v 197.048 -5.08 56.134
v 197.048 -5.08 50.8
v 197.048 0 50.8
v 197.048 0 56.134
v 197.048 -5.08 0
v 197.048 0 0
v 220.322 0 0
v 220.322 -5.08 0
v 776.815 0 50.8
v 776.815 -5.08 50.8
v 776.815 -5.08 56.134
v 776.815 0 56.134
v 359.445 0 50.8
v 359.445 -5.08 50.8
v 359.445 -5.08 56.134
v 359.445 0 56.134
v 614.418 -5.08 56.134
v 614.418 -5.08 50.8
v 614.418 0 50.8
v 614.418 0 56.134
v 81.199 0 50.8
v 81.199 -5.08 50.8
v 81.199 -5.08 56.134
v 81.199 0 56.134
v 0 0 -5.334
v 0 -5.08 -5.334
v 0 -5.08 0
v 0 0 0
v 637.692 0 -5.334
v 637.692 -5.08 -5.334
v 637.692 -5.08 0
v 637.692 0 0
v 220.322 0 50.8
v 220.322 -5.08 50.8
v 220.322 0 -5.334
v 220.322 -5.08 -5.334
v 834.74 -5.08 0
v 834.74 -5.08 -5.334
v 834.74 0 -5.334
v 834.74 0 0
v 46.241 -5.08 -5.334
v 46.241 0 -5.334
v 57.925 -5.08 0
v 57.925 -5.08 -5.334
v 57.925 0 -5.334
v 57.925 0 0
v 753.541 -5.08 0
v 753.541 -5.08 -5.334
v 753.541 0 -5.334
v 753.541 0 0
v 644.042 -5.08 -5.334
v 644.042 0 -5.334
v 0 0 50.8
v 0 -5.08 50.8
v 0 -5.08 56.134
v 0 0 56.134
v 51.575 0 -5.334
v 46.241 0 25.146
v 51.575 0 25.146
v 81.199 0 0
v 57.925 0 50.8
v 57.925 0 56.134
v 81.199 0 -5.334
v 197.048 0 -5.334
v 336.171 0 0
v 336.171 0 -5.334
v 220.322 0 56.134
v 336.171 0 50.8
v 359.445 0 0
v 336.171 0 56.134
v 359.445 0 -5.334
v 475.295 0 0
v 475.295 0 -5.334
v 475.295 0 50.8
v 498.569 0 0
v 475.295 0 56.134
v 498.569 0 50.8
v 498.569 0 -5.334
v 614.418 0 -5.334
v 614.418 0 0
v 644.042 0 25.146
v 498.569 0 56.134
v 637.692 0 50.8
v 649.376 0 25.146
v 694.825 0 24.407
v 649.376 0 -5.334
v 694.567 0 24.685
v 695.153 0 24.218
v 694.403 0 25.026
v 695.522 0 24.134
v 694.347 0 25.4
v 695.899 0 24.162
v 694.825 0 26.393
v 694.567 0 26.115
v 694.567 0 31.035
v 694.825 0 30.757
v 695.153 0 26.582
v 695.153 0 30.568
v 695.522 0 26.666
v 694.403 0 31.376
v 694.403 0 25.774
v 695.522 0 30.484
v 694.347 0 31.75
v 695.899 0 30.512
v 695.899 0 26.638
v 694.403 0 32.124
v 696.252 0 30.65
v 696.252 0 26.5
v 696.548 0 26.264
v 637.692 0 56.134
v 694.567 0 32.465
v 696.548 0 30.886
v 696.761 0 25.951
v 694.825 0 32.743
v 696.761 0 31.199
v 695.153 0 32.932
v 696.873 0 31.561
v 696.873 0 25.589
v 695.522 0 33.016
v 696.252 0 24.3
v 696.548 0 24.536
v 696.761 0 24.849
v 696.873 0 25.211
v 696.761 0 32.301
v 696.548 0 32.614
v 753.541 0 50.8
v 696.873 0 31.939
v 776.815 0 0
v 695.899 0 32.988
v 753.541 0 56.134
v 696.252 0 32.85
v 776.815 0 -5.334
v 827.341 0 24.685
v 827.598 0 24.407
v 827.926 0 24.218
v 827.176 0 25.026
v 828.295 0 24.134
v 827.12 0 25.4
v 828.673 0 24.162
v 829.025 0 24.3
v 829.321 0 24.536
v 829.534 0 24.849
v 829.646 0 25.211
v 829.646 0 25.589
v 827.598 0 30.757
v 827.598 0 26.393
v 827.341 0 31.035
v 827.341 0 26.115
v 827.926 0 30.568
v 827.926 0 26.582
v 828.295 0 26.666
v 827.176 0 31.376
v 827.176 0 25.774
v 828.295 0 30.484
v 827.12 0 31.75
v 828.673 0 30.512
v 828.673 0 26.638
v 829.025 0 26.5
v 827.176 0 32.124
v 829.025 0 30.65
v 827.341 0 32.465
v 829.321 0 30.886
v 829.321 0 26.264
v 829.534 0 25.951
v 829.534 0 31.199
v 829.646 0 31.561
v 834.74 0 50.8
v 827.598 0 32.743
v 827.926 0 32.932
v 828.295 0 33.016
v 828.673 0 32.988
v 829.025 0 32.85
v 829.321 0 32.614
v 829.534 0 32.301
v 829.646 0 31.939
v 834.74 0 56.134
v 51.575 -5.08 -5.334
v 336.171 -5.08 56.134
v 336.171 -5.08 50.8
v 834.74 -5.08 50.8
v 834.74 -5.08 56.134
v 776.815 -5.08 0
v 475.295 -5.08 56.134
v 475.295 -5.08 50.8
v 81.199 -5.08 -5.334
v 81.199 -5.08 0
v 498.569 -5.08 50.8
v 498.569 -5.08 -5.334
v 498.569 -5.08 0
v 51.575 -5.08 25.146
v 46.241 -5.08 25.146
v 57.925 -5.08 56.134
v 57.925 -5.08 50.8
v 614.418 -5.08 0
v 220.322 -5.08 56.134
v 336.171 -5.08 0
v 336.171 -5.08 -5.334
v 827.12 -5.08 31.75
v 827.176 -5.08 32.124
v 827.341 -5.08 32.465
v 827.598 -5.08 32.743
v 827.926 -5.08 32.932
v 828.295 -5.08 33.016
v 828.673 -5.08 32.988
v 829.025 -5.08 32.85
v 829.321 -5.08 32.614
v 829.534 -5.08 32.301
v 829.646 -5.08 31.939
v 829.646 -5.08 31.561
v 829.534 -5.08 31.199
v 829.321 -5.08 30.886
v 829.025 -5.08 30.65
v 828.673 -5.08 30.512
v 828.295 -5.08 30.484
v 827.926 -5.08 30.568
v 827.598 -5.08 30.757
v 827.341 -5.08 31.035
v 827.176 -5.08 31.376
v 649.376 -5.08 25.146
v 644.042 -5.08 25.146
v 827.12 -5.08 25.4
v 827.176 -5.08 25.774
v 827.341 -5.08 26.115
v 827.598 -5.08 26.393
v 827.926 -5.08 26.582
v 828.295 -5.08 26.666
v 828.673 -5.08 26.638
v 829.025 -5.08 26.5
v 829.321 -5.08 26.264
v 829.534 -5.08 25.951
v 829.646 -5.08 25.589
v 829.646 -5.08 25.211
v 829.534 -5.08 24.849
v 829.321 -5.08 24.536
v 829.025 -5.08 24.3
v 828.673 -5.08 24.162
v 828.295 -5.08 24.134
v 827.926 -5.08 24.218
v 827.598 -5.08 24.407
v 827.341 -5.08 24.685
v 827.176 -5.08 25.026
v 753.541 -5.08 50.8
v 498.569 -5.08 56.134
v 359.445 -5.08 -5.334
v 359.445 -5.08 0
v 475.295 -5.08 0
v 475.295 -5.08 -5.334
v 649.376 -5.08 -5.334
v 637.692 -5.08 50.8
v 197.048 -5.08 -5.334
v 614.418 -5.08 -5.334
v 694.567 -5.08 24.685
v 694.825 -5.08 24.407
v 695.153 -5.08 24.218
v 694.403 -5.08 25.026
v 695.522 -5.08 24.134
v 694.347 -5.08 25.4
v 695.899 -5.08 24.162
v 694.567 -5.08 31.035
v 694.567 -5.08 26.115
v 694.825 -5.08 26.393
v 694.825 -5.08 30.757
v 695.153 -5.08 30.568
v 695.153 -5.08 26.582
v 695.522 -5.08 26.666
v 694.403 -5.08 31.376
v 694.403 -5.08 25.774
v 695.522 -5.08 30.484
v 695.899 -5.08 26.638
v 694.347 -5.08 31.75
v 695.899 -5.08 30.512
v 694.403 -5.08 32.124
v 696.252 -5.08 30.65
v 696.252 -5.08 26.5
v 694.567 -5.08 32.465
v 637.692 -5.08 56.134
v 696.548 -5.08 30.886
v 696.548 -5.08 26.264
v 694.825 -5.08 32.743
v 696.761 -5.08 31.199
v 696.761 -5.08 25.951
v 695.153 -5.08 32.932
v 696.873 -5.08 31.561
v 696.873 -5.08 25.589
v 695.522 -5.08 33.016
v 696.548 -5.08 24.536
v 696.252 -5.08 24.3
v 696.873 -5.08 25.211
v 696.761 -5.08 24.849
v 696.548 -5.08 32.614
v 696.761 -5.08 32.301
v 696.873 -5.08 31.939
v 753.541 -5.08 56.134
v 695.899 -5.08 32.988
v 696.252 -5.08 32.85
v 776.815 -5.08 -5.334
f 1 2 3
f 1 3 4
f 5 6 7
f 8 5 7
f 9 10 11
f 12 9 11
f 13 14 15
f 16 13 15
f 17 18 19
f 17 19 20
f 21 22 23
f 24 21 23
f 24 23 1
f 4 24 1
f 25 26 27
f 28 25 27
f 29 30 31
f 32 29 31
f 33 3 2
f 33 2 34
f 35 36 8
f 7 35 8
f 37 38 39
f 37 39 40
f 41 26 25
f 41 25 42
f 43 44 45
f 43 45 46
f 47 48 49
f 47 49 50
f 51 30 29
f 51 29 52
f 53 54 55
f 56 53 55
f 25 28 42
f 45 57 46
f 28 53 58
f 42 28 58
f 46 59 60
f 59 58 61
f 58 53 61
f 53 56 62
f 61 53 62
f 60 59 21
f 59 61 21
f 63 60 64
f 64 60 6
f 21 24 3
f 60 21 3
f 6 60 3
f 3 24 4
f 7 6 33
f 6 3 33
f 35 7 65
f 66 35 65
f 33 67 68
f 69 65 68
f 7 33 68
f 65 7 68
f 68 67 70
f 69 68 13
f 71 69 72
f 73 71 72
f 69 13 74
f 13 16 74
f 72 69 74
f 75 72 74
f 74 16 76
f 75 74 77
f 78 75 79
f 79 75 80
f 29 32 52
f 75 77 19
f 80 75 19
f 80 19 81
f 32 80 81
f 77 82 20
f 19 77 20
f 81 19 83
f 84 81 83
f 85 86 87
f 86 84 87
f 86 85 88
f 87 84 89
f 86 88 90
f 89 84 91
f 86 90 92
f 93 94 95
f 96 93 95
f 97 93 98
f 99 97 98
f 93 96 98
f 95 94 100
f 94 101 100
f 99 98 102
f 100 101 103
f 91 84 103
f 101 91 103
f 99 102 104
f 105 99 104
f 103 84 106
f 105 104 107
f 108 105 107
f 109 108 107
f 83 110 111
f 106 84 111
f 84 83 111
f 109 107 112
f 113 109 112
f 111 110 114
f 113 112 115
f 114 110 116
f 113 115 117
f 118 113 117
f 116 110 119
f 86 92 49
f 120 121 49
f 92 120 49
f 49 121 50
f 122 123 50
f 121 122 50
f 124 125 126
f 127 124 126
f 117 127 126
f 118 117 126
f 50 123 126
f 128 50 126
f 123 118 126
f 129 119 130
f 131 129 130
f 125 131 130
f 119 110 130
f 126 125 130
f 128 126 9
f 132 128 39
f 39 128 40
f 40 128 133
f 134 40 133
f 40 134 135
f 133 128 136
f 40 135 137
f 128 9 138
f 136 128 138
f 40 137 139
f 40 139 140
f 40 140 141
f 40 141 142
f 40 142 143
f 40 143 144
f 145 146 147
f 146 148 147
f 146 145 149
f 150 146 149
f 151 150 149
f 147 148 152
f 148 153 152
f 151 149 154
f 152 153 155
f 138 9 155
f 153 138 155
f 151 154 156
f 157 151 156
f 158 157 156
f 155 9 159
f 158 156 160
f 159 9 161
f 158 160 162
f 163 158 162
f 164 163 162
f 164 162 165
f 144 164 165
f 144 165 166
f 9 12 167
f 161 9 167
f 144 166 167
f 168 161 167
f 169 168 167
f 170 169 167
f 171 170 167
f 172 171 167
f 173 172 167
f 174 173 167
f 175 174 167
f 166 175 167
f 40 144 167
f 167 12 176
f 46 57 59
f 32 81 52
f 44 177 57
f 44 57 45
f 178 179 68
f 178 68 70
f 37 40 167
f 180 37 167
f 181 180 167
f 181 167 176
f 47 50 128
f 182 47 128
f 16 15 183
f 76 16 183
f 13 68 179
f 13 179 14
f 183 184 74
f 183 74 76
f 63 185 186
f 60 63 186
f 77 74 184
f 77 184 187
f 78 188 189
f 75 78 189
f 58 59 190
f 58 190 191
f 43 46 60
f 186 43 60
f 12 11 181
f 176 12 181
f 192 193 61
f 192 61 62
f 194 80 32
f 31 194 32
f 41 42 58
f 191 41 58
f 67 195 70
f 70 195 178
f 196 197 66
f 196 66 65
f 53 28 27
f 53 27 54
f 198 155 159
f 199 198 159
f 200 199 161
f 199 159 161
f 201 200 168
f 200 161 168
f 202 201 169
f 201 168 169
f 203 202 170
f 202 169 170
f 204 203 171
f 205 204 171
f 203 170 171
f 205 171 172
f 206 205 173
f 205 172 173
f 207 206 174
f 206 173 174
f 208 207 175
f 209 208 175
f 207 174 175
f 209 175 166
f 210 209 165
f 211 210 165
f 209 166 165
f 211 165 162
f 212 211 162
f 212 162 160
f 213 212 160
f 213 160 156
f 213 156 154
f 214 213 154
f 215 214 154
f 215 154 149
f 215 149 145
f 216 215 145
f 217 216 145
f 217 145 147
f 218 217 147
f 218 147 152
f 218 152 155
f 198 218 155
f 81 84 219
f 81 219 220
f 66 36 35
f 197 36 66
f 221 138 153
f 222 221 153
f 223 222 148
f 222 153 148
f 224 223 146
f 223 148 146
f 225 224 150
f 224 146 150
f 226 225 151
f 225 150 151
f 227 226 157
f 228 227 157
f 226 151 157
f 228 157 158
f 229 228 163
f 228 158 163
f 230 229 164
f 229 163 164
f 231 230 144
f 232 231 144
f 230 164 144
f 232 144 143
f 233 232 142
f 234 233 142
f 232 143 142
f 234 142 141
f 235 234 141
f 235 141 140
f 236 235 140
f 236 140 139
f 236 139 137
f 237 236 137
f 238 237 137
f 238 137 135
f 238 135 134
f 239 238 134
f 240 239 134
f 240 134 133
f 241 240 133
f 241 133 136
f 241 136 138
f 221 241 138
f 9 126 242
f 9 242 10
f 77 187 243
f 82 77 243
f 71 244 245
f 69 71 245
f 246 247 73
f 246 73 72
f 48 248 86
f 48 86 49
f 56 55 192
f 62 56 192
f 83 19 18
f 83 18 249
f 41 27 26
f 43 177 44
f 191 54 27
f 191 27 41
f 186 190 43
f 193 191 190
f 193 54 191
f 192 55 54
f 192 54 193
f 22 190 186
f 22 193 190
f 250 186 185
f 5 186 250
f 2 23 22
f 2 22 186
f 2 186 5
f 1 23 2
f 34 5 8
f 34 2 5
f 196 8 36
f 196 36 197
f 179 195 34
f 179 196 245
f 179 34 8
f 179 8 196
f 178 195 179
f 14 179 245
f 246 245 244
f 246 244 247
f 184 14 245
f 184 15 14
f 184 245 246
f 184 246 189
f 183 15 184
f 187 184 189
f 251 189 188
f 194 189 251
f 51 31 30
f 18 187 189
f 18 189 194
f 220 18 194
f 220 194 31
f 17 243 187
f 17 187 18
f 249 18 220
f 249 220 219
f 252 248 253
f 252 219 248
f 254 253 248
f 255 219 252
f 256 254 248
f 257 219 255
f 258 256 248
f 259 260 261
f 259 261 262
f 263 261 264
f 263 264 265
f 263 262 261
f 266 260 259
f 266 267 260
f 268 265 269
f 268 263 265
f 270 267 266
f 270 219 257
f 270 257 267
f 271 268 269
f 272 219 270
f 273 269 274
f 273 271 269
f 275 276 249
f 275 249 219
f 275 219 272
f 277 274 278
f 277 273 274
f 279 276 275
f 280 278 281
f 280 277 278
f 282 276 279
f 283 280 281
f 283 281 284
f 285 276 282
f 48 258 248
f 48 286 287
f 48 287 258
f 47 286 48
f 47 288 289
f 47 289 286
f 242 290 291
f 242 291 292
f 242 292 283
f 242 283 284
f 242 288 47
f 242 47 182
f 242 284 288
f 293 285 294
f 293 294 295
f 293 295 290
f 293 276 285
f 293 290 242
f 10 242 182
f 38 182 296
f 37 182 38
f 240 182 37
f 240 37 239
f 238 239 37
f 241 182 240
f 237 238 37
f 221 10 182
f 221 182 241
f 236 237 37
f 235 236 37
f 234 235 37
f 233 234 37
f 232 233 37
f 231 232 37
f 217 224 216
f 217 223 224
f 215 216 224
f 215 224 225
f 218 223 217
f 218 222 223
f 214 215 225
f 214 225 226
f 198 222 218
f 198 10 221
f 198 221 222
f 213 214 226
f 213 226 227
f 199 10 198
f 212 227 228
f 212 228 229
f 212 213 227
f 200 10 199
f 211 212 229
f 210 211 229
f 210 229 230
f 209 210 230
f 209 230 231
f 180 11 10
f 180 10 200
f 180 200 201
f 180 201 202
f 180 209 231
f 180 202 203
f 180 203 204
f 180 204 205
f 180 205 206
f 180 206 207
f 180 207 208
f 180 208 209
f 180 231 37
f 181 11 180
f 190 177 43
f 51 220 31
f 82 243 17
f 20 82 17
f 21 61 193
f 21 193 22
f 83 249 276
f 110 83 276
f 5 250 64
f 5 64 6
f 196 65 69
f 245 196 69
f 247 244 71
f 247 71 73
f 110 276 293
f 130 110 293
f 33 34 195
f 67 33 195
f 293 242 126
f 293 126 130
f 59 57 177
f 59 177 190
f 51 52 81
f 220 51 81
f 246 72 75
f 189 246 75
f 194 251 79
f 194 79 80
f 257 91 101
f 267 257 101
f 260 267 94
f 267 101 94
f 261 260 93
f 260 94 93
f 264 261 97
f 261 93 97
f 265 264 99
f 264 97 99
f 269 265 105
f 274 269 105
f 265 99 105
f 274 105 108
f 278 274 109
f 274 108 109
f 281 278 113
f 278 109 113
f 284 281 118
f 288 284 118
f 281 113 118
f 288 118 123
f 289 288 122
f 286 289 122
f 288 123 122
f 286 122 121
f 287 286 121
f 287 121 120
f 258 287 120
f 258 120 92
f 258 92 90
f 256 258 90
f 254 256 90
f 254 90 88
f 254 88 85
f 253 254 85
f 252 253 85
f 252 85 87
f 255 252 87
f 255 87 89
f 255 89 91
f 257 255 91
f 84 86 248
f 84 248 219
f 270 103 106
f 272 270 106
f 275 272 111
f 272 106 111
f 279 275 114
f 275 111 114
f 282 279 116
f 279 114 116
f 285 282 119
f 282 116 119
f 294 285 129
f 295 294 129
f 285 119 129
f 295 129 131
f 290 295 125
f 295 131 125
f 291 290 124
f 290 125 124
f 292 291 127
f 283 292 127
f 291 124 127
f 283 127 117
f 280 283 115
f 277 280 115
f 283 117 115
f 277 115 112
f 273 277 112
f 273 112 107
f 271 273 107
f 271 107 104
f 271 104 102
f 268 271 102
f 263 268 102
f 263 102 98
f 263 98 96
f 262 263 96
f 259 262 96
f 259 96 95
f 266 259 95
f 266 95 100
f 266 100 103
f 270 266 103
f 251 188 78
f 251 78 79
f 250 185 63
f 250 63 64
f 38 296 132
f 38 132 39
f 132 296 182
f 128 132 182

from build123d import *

# Parameters (mm, degrees)
F0_W     = 834.740075
F0_H     = 50.8
F1_DEPTH = 5.08
F3_W     = 57.9247
F3_H     = 5.334
F3_W_2   = 115.8494
F4_DEPTH = 5.08
F5_W     = 5.334
F5_H     = 30.48
F6_DEPTH = 25.4
F7_R     = 1.27
F8_DEPTH = 5.081


with BuildPart() as f1:
    # F0 (on Front) → F1 (new body)
    with BuildSketch(Plane.XZ):
        with Locations((417.370037, 25.4)):
            Rectangle(F0_W, F0_H)
    extrude(amount=F1_DEPTH)

    # F3 (on face) → F4 (join)
    with BuildSketch(Plane.XZ.offset(5.08)):
        with Locations((28.96235, 53.467)):
            Rectangle(F3_W, F3_H)
        with Locations((139.123346, 53.467)):
            Rectangle(F3_W_2, F3_H)
        with Locations((28.96235, -2.667)):
            Rectangle(F3_W, F3_H)
        with Locations((139.123346, -2.667)):
            Rectangle(F3_W_2, F3_H)
        with Locations((278.246692, 53.467)):
            Rectangle(F3_W_2, F3_H)
        with Locations((278.246692, -2.667)):
            Rectangle(F3_W_2, F3_H)
        with Locations((417.370038, 53.467)):
            Rectangle(F3_W_2, F3_H)
        with Locations((417.370038, -2.667)):
            Rectangle(F3_W_2, F3_H)
        with Locations((556.493384, 53.467)):
            Rectangle(F3_W_2, F3_H)
        with Locations((556.493384, -2.667)):
            Rectangle(F3_W_2, F3_H)
        with Locations((695.61673, 53.467)):
            Rectangle(F3_W_2, F3_H)
        with Locations((695.61673, -2.667)):
            Rectangle(F3_W_2, F3_H)
        with Locations((805.777725, 53.467)):
            Rectangle(F3_W, F3_H)
        with Locations((805.777725, -2.667)):
            Rectangle(F3_W, F3_H)
    extrude(amount=-F4_DEPTH)

    # F5 (on face) → F6 (cut)
    with BuildSketch(Plane(origin=(0, 0, 0), x_dir=(-1, 0, 0), z_dir=(0, 1, 0))):
        with Locations((-646.70903, 9.906)):
            Rectangle(F5_W, F5_H)
        with Locations((-48.9077, 9.906)):
            Rectangle(F5_W, F5_H)
    extrude(amount=-F6_DEPTH, mode=Mode.SUBTRACT)

    # F7 (on face) → F8 (cut, through all)
    with BuildSketch(Plane(origin=(0, 0, 0), x_dir=(-1, 0, 0), z_dir=(0, 1, 0))):
        with Locations((-695.61673, 25.4)):
            Circle(F7_R)
        with Locations((-695.61673, 31.75)):
            Circle(F7_R)
        with Locations((-828.390075, 31.75)):
            Circle(F7_R)
        with Locations((-828.390075, 25.4)):
            Circle(F7_R)
    extrude(amount=-F8_DEPTH, mode=Mode.SUBTRACT)


solid = f1.part
